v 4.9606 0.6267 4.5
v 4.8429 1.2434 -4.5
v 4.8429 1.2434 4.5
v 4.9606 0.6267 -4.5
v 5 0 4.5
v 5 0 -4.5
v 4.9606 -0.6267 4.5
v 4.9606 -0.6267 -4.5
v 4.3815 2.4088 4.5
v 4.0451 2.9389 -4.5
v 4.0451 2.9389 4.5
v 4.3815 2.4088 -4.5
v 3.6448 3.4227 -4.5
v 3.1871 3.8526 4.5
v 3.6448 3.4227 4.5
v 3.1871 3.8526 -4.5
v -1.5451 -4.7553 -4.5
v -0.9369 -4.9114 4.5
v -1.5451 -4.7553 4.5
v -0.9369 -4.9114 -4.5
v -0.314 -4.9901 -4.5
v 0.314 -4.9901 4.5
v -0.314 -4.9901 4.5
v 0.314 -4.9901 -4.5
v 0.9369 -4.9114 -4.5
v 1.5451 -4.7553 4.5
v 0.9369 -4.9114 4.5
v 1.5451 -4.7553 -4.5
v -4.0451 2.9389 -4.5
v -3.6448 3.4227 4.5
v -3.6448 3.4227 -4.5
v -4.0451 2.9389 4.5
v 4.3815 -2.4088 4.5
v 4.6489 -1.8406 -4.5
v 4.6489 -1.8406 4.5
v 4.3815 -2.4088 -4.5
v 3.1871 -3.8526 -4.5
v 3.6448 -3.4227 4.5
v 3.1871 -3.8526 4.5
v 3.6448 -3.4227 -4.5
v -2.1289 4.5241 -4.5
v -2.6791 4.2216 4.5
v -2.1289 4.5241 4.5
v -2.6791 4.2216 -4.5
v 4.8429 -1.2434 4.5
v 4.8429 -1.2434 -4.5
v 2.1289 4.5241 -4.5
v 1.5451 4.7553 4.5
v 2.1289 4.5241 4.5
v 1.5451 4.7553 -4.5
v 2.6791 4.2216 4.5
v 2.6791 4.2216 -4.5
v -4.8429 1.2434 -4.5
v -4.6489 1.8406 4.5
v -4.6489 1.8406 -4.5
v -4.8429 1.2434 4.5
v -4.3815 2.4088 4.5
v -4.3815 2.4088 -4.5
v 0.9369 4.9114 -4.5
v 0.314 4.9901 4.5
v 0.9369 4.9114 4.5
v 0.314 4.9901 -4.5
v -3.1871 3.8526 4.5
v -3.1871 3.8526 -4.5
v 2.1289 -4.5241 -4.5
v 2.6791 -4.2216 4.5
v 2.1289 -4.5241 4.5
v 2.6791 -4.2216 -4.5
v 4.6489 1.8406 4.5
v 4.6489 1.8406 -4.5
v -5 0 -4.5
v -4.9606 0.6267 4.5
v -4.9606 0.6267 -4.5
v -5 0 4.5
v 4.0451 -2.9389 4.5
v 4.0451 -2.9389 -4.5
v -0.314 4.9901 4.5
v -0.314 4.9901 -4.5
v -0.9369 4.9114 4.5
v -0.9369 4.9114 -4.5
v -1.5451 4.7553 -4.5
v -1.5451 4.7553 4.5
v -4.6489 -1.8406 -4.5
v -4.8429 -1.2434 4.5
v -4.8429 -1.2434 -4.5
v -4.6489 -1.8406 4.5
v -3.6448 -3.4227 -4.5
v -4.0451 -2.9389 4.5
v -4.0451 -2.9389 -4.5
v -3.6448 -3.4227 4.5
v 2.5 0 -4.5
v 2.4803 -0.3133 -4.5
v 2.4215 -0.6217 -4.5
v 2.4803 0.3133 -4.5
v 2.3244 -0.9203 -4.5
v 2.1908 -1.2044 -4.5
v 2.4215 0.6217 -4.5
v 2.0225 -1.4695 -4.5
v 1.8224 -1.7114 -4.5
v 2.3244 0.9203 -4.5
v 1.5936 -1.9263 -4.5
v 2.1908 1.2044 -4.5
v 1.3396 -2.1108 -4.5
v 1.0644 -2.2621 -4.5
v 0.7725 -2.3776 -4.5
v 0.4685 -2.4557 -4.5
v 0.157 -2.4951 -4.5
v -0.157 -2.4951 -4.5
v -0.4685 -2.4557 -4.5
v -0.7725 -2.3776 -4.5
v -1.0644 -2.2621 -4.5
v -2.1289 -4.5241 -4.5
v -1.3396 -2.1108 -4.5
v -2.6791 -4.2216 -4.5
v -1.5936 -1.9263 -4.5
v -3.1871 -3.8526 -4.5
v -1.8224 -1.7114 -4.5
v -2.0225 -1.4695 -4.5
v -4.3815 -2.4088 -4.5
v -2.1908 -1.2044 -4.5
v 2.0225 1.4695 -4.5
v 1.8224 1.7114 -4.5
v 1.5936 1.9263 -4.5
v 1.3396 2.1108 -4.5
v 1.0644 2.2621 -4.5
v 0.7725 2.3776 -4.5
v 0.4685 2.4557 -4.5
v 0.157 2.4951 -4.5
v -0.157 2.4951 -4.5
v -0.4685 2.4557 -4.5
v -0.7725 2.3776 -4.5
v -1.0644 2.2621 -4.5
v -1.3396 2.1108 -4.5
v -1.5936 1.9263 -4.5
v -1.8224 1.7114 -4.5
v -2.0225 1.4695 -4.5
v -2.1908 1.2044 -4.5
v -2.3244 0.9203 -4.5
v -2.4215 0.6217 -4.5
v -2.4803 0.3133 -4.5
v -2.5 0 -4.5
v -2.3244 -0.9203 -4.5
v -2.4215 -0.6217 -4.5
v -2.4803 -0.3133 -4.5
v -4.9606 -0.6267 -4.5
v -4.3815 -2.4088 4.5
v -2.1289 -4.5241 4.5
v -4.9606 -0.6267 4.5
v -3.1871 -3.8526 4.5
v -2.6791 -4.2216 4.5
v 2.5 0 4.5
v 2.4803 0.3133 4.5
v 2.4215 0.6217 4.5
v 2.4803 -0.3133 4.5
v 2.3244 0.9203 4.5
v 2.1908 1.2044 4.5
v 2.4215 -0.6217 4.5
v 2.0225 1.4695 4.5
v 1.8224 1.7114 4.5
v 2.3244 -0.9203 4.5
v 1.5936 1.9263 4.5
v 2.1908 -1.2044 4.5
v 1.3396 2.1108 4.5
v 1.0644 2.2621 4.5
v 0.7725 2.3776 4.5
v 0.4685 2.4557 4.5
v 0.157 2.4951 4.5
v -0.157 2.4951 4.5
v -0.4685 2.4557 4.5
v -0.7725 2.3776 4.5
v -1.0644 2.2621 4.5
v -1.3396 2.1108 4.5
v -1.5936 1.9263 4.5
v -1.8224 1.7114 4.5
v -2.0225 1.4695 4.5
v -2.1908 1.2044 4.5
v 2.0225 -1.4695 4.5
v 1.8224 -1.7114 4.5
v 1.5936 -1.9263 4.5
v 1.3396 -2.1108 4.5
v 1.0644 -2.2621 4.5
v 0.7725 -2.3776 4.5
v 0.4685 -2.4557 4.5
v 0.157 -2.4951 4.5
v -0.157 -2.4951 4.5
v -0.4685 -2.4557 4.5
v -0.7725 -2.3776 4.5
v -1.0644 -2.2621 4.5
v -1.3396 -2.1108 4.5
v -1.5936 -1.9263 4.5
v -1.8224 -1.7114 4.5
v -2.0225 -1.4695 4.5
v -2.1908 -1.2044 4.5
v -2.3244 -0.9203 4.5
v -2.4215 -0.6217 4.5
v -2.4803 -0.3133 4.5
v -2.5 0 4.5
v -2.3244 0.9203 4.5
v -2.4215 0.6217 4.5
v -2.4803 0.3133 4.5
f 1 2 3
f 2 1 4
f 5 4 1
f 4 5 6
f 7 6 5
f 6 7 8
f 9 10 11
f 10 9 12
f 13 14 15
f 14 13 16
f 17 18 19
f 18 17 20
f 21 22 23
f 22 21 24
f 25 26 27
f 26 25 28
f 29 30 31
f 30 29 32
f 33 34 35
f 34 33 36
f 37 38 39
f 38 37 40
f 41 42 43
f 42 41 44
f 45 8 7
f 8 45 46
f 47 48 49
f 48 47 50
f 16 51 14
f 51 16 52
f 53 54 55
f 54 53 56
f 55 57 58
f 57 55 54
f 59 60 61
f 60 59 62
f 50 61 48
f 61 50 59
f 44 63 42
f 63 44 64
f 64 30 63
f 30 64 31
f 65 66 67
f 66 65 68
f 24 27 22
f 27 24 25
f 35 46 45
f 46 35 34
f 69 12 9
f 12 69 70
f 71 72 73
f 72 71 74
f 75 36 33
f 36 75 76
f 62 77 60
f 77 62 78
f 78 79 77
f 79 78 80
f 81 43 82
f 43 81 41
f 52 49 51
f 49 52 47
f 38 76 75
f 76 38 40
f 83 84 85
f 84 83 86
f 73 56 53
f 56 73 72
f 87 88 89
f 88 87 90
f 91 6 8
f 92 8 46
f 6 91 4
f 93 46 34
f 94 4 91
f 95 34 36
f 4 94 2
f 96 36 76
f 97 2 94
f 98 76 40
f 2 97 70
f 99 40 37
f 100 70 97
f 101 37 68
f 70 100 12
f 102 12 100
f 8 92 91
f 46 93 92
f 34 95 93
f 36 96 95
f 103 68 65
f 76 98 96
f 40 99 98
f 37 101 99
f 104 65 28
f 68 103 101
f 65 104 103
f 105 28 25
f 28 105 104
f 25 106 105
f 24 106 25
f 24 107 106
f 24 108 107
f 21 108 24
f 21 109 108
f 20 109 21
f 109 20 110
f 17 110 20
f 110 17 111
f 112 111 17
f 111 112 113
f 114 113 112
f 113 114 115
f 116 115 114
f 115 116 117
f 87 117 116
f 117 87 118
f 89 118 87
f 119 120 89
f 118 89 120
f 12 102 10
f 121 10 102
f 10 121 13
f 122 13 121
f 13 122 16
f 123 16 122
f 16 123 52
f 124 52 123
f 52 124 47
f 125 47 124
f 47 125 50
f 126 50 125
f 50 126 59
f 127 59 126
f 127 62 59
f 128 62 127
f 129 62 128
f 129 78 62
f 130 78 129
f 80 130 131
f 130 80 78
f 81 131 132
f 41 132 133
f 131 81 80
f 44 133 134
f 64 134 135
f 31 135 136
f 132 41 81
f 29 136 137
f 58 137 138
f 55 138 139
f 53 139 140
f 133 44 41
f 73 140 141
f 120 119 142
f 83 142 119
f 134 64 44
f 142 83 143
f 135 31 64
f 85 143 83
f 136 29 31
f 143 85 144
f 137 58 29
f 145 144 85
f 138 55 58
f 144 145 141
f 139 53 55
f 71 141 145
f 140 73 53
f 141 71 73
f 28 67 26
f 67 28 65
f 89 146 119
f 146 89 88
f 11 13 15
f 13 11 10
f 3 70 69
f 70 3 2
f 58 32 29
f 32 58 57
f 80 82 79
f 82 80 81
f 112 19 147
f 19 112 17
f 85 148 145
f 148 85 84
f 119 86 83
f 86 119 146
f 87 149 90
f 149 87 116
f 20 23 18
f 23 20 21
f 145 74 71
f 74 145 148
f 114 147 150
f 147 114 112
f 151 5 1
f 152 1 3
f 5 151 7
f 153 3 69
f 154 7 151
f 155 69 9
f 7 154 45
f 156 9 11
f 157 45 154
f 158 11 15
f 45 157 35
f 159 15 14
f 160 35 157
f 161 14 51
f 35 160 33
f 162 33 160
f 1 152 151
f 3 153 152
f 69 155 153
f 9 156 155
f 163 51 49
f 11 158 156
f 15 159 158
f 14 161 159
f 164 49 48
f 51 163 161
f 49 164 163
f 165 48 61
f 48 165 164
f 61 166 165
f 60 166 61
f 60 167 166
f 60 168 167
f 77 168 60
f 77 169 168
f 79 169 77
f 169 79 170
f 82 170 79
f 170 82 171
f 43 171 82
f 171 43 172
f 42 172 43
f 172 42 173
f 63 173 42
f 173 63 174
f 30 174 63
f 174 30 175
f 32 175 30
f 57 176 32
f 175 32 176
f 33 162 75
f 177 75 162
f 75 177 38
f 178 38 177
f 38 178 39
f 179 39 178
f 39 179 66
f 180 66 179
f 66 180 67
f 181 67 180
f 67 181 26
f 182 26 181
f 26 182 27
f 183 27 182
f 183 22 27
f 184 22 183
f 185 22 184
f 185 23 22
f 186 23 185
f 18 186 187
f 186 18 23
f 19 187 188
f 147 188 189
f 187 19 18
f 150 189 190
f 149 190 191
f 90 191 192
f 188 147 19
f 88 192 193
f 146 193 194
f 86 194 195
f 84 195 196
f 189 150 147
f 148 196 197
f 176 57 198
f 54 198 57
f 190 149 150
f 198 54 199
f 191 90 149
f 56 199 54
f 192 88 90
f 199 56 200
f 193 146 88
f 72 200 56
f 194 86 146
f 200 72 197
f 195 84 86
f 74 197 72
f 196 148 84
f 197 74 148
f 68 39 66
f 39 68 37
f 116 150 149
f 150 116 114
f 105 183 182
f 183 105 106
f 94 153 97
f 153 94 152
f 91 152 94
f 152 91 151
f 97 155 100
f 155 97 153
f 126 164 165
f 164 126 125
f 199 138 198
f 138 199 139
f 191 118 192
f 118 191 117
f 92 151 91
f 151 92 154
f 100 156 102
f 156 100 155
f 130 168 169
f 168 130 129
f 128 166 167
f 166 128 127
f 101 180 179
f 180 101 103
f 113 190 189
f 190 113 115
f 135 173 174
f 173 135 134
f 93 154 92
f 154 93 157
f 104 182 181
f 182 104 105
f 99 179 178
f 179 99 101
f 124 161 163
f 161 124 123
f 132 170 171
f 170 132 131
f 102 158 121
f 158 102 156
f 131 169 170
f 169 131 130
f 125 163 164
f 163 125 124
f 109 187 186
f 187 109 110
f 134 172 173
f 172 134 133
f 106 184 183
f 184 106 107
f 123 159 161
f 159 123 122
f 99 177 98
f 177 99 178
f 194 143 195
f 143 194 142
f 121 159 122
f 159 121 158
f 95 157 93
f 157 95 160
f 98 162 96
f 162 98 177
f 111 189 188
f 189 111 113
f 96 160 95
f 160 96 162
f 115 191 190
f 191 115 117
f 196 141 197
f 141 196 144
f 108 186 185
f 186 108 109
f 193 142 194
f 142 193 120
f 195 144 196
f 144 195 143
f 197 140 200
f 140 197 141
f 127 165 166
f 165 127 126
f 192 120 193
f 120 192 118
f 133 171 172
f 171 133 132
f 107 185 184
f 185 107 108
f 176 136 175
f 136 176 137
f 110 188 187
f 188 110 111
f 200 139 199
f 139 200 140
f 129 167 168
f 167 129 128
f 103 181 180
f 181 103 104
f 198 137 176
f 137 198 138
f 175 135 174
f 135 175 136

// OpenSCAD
$fn = 50;


difference() {
	union() {
		translate(v = [0, 0, -4.5000000000]) {
			cylinder(h = 9, r = 5.0000000000);
		}
	}
	union() {
		translate(v = [0, 0, -100.0000000000]) {
			cylinder(h = 200, r = 2.5000000000);
		}
	}
}
